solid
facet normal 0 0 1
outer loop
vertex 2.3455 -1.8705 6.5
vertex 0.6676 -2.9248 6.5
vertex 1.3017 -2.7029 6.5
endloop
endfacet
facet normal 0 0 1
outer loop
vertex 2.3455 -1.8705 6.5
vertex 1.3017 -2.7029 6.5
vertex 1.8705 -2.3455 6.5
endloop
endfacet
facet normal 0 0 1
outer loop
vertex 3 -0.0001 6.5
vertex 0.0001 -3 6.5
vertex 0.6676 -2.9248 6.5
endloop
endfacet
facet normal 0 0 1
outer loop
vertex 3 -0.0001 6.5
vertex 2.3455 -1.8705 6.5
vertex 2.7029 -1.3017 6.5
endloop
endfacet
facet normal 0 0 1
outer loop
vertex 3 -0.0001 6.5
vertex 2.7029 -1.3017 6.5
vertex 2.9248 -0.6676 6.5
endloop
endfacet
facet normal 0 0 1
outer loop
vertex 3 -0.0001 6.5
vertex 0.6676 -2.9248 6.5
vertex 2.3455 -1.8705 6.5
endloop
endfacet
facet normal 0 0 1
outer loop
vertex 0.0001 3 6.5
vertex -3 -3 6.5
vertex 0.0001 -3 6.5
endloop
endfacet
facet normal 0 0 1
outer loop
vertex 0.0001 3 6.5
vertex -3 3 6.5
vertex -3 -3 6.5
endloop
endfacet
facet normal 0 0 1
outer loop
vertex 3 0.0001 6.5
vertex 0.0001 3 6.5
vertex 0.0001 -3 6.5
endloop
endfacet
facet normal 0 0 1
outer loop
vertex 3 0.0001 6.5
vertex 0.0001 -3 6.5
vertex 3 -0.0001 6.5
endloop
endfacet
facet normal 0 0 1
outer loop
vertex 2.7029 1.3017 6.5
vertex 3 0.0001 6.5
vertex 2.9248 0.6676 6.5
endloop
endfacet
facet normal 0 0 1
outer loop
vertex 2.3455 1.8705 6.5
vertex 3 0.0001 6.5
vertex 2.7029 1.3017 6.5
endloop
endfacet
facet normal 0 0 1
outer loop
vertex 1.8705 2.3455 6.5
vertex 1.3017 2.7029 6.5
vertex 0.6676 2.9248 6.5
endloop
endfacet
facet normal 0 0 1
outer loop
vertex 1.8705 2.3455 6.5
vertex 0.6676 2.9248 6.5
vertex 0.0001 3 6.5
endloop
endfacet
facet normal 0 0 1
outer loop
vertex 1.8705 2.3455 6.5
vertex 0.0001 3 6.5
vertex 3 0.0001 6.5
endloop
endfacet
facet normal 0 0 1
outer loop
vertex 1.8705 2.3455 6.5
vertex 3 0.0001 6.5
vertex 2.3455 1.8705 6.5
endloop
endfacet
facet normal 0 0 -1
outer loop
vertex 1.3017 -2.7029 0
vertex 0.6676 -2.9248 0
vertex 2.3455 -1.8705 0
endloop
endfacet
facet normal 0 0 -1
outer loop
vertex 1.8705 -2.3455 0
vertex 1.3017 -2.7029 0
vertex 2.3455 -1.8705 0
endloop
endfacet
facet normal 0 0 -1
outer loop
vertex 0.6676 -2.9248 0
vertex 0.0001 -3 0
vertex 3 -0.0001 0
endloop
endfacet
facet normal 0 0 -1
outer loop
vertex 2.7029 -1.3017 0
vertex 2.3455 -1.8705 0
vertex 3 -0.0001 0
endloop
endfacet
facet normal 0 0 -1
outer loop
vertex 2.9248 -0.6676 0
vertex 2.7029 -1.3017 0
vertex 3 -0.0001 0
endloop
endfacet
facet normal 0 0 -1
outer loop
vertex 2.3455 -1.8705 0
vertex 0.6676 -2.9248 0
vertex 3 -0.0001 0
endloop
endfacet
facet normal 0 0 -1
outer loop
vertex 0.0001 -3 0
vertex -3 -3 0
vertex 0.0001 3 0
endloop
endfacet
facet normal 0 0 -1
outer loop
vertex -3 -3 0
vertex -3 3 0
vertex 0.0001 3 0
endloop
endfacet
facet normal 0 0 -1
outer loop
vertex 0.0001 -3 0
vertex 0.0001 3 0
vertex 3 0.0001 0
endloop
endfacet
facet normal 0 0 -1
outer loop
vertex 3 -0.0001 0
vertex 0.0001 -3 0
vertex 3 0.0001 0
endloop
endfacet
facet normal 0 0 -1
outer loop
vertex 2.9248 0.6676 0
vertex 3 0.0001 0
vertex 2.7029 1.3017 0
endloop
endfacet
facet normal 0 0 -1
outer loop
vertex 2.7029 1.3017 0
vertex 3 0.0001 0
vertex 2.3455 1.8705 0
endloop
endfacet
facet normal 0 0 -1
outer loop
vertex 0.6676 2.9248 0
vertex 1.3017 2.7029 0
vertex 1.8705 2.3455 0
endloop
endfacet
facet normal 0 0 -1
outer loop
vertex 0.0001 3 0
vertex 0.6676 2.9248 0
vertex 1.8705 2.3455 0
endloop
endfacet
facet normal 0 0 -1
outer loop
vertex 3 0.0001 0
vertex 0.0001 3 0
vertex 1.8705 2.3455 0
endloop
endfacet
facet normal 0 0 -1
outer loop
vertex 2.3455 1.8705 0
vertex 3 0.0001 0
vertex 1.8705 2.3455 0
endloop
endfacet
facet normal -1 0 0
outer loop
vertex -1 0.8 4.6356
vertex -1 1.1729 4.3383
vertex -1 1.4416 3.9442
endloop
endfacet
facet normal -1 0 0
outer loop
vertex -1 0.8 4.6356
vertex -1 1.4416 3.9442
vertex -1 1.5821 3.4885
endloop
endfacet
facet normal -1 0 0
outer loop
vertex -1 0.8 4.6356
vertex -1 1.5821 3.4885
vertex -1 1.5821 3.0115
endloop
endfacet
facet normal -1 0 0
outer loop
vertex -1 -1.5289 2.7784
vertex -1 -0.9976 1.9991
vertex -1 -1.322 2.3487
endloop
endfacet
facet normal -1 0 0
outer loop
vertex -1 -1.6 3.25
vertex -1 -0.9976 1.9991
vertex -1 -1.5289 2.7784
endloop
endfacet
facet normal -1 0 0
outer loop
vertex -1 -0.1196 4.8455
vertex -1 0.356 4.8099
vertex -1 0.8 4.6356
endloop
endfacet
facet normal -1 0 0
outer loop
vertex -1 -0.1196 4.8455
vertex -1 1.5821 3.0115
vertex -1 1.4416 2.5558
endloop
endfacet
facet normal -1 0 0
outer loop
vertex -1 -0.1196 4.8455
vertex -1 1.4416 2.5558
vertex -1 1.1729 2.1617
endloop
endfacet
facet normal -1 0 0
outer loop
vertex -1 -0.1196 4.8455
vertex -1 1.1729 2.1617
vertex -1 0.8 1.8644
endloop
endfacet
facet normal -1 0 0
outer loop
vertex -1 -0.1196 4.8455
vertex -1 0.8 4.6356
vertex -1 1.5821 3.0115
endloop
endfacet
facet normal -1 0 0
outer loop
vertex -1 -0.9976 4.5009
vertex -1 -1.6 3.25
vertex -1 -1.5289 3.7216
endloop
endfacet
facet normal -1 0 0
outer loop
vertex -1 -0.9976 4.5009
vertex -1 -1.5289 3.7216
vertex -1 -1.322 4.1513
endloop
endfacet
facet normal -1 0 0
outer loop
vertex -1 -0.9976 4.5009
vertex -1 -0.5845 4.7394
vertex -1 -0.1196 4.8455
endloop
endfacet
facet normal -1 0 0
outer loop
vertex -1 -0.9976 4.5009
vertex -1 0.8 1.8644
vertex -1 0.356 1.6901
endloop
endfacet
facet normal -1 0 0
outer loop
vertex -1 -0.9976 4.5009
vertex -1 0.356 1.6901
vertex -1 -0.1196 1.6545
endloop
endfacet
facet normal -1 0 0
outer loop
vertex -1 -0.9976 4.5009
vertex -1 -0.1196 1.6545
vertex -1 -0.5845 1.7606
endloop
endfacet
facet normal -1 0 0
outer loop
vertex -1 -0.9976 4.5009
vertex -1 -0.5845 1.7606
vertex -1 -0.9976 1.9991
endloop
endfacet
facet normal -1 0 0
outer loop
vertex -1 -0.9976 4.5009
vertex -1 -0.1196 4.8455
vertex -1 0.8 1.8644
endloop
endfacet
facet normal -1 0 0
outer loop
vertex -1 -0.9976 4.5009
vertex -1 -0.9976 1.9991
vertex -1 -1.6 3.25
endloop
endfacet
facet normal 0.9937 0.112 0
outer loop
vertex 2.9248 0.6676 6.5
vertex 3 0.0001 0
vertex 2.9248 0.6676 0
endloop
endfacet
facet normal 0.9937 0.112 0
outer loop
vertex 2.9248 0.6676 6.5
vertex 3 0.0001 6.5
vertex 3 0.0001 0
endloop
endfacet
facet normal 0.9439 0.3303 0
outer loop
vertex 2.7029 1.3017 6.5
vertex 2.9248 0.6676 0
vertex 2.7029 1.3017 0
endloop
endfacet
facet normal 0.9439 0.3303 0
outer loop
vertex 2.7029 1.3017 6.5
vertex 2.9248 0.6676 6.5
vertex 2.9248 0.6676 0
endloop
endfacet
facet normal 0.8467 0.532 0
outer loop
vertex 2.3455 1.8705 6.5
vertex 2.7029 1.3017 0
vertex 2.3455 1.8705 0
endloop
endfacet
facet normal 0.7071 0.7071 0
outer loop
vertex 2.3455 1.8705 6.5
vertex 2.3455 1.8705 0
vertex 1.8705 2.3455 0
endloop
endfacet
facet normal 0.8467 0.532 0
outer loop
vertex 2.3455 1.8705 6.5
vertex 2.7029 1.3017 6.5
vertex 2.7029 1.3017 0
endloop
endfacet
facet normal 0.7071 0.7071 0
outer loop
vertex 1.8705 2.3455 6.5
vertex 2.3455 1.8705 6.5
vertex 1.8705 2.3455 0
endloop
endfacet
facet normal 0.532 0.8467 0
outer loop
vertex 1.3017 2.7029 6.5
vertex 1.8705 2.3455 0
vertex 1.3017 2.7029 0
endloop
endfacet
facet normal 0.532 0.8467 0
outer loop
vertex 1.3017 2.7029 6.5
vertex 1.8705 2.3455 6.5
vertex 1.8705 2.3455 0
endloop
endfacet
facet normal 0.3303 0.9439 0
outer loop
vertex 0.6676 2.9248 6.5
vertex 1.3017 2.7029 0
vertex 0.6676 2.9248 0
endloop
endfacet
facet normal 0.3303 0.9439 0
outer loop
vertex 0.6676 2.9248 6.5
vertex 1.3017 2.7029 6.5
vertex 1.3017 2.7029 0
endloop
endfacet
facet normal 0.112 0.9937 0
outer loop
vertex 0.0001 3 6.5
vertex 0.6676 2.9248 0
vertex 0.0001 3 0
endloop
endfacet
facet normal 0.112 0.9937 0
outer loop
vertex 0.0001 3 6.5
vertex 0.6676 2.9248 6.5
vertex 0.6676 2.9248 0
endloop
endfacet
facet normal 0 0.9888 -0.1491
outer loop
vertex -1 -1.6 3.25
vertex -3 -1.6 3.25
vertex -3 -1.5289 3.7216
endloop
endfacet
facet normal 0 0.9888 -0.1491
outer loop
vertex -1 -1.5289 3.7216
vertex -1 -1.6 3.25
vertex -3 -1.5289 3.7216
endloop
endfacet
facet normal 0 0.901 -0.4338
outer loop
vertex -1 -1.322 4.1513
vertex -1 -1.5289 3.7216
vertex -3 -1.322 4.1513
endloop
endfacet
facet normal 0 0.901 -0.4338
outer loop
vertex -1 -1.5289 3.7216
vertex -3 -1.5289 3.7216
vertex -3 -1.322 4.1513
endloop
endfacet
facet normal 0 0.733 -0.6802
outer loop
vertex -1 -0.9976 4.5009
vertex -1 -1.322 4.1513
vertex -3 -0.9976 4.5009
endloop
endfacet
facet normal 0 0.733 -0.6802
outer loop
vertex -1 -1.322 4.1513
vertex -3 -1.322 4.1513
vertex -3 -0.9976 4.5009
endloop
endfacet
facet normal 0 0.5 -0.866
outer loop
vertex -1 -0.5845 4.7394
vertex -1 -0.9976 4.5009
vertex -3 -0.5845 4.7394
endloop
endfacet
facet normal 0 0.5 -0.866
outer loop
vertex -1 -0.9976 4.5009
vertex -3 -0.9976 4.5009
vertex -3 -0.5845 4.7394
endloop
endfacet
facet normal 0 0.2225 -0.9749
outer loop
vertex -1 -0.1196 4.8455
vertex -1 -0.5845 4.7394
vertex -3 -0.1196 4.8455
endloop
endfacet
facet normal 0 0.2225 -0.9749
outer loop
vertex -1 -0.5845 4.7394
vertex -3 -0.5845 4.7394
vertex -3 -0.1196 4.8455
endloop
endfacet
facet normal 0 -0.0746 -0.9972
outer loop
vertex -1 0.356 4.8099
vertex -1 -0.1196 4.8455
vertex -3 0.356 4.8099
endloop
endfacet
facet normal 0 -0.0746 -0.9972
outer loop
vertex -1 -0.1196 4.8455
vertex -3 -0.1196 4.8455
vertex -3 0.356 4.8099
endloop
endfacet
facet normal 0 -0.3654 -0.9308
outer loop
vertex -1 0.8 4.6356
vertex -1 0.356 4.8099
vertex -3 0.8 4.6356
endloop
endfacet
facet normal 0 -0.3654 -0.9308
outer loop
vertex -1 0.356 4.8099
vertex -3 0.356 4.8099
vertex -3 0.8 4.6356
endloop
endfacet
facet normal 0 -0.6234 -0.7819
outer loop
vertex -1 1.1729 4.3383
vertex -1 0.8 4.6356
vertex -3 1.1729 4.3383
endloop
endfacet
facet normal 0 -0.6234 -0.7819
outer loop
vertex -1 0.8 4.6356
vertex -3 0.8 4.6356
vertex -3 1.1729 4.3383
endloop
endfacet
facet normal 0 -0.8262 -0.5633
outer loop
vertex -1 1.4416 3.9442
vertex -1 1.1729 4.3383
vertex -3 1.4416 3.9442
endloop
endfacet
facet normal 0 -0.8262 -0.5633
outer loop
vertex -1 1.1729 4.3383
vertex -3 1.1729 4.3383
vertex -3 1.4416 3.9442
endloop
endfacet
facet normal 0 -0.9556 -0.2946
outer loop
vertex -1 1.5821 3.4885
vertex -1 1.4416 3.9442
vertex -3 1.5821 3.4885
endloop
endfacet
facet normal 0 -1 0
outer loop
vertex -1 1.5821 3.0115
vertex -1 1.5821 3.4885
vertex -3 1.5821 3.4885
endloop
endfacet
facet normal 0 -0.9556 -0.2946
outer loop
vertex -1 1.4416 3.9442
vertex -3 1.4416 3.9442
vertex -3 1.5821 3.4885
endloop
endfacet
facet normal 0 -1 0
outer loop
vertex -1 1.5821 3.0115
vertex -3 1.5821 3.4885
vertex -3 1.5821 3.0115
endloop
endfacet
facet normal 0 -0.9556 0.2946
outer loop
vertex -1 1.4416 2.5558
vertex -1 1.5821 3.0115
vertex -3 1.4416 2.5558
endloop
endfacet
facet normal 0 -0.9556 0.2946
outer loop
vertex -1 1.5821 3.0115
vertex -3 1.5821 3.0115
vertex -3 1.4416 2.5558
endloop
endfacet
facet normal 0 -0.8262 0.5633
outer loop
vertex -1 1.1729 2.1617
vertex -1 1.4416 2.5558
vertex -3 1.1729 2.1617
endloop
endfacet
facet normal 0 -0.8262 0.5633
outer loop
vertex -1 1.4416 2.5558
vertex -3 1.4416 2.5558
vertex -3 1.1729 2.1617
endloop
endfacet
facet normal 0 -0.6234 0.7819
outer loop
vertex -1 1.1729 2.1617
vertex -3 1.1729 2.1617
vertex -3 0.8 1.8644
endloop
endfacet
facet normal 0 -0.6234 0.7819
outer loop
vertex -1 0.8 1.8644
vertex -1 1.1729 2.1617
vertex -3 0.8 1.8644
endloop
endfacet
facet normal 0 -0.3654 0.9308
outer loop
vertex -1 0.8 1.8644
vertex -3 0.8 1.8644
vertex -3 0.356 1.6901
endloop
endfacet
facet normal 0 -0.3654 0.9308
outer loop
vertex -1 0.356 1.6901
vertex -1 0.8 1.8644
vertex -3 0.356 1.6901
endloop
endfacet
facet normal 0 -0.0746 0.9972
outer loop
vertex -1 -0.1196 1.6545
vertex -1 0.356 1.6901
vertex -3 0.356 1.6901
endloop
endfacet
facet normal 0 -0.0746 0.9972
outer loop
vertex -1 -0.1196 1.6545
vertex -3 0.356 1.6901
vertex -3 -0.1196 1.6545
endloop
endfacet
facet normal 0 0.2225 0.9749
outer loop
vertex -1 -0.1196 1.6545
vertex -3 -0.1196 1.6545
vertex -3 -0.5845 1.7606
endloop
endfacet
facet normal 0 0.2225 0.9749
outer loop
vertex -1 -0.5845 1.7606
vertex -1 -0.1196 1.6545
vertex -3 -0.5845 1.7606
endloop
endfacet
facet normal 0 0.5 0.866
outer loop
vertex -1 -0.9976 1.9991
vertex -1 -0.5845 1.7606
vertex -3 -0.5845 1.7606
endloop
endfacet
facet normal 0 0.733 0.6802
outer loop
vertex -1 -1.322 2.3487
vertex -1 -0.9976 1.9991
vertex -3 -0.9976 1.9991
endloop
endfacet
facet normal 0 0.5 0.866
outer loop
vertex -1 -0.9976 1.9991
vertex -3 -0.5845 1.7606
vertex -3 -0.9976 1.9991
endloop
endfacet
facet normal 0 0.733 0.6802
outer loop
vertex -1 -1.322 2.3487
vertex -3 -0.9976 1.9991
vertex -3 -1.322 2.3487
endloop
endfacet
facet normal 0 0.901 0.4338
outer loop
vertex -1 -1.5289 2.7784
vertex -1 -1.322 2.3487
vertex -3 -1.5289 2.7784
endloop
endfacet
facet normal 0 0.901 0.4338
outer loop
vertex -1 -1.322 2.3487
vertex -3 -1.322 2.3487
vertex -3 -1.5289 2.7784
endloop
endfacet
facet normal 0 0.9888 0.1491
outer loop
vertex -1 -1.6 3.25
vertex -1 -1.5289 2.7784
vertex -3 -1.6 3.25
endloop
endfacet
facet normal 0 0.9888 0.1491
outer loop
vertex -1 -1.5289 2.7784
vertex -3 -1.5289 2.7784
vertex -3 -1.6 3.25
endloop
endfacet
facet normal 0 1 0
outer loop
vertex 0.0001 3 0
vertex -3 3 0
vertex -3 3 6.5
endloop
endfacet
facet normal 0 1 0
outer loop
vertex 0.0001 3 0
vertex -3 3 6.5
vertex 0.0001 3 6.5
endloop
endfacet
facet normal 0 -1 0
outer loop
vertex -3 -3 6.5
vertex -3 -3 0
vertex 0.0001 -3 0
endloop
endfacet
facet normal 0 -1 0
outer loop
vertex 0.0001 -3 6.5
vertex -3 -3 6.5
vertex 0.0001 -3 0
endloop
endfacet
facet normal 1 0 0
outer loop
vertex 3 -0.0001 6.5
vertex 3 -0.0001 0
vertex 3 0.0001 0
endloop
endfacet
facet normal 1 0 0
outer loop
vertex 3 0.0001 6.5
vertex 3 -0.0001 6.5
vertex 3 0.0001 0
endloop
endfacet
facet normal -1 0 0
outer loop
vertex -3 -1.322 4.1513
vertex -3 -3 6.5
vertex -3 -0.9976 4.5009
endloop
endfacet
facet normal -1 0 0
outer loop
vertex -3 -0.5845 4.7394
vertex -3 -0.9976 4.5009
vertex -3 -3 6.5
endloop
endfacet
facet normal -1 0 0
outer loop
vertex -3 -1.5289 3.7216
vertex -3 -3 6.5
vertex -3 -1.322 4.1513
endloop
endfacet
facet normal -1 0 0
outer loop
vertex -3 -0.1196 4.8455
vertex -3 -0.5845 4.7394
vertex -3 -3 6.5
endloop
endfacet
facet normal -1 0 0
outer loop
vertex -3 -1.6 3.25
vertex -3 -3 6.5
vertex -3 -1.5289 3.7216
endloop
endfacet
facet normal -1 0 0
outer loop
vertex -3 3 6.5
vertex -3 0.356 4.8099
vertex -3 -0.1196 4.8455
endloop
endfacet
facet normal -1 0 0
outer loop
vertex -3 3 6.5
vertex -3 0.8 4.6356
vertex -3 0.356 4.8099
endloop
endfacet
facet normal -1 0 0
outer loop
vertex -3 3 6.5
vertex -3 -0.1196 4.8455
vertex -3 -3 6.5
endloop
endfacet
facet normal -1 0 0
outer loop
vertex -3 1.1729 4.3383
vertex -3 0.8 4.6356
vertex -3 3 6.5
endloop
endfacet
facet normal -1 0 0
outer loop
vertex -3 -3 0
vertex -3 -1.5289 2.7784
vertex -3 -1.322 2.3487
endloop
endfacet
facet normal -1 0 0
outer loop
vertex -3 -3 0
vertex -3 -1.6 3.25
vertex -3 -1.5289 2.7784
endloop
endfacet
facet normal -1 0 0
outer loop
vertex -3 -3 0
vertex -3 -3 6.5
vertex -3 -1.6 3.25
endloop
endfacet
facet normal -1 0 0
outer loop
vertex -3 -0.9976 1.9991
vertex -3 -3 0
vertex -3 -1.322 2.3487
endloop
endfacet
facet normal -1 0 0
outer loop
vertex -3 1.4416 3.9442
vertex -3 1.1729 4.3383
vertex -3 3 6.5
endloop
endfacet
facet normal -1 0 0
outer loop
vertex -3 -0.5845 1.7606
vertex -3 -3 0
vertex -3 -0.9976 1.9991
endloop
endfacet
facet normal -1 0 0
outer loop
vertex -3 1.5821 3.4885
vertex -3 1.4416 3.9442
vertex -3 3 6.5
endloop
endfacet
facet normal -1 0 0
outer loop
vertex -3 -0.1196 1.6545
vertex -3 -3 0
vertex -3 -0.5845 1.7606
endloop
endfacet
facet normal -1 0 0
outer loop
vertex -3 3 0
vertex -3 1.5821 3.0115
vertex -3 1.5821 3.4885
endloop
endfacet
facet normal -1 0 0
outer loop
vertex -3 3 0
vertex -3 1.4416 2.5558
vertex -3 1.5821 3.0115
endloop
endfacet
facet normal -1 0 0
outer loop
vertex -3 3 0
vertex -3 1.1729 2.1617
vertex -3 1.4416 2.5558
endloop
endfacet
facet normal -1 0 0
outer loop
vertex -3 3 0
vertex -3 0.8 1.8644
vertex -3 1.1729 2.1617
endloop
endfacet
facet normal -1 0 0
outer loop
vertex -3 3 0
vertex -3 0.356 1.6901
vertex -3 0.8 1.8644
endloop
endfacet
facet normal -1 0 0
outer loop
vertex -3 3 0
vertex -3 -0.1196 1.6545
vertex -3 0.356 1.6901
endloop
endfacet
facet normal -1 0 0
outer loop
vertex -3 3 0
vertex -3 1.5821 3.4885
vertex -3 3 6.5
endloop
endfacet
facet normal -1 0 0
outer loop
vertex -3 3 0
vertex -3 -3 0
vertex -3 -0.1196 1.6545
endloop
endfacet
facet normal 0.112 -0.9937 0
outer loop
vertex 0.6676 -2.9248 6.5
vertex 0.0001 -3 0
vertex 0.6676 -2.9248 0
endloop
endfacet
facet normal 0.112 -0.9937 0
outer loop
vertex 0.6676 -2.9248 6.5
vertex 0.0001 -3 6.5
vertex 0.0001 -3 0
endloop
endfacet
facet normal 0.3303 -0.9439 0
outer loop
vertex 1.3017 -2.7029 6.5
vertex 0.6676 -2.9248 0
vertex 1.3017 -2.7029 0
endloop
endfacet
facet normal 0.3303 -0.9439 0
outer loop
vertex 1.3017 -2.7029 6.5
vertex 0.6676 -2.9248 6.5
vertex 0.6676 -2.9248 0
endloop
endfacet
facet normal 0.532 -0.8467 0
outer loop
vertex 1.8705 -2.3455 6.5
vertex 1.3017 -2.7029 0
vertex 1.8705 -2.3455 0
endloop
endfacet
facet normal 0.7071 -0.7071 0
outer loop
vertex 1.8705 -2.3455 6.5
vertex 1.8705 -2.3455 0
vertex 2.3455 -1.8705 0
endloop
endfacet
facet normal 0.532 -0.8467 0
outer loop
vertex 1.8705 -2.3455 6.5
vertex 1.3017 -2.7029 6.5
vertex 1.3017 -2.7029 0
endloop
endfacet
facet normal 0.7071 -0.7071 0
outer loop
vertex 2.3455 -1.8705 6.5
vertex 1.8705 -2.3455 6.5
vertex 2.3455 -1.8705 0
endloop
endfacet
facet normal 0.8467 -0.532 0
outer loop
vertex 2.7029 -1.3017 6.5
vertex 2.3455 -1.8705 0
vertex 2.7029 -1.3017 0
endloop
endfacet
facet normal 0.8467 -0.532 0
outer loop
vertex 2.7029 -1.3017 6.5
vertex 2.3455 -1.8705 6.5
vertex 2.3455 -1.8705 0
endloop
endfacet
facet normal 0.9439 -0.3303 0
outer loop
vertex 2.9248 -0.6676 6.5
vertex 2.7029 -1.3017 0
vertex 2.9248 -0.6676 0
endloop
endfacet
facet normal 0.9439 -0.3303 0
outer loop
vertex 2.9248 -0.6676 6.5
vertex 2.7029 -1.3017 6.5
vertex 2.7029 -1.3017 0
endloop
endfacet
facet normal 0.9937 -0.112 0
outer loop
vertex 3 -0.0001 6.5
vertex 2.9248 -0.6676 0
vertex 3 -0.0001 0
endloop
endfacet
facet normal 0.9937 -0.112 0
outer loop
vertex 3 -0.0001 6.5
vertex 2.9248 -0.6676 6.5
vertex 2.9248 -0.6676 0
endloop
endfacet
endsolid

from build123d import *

# Parameters (mm, degrees)
SKETCH1_W           = 6
SKETCH1_H           = 6
BOSS_EXTRUDE1_DEPTH = 6.5
FILLET1_R           = 3
SKETCH2_R           = 1.6
CUT_EXTRUDE1_DEPTH  = 2


with BuildPart() as part:
    # Sketch1 → Boss-Extrude1 (new body)
    with BuildSketch(Plane.XY):
        Rectangle(SKETCH1_W, SKETCH1_H)
    extrude(amount=BOSS_EXTRUDE1_DEPTH)

    # Fillet1
    fillet1_edges = [part.edges().sort_by_distance(p)[0] for p in [
        (3, -3, 3.25),
        (3, 3, 3.25),
    ]]
    fillet(fillet1_edges, radius=FILLET1_R - 0.0001)  # a hair under: the kernel refuses the full size

    # Sketch2 → Cut-Extrude1 (cut)
    with BuildSketch(Plane.ZY.offset(3)):
        with Locations(Location((3.25, 0, 0), (0, 0, 270))):
            Circle(SKETCH2_R)
    extrude(amount=-CUT_EXTRUDE1_DEPTH, mode=Mode.SUBTRACT)


solid = part.part
